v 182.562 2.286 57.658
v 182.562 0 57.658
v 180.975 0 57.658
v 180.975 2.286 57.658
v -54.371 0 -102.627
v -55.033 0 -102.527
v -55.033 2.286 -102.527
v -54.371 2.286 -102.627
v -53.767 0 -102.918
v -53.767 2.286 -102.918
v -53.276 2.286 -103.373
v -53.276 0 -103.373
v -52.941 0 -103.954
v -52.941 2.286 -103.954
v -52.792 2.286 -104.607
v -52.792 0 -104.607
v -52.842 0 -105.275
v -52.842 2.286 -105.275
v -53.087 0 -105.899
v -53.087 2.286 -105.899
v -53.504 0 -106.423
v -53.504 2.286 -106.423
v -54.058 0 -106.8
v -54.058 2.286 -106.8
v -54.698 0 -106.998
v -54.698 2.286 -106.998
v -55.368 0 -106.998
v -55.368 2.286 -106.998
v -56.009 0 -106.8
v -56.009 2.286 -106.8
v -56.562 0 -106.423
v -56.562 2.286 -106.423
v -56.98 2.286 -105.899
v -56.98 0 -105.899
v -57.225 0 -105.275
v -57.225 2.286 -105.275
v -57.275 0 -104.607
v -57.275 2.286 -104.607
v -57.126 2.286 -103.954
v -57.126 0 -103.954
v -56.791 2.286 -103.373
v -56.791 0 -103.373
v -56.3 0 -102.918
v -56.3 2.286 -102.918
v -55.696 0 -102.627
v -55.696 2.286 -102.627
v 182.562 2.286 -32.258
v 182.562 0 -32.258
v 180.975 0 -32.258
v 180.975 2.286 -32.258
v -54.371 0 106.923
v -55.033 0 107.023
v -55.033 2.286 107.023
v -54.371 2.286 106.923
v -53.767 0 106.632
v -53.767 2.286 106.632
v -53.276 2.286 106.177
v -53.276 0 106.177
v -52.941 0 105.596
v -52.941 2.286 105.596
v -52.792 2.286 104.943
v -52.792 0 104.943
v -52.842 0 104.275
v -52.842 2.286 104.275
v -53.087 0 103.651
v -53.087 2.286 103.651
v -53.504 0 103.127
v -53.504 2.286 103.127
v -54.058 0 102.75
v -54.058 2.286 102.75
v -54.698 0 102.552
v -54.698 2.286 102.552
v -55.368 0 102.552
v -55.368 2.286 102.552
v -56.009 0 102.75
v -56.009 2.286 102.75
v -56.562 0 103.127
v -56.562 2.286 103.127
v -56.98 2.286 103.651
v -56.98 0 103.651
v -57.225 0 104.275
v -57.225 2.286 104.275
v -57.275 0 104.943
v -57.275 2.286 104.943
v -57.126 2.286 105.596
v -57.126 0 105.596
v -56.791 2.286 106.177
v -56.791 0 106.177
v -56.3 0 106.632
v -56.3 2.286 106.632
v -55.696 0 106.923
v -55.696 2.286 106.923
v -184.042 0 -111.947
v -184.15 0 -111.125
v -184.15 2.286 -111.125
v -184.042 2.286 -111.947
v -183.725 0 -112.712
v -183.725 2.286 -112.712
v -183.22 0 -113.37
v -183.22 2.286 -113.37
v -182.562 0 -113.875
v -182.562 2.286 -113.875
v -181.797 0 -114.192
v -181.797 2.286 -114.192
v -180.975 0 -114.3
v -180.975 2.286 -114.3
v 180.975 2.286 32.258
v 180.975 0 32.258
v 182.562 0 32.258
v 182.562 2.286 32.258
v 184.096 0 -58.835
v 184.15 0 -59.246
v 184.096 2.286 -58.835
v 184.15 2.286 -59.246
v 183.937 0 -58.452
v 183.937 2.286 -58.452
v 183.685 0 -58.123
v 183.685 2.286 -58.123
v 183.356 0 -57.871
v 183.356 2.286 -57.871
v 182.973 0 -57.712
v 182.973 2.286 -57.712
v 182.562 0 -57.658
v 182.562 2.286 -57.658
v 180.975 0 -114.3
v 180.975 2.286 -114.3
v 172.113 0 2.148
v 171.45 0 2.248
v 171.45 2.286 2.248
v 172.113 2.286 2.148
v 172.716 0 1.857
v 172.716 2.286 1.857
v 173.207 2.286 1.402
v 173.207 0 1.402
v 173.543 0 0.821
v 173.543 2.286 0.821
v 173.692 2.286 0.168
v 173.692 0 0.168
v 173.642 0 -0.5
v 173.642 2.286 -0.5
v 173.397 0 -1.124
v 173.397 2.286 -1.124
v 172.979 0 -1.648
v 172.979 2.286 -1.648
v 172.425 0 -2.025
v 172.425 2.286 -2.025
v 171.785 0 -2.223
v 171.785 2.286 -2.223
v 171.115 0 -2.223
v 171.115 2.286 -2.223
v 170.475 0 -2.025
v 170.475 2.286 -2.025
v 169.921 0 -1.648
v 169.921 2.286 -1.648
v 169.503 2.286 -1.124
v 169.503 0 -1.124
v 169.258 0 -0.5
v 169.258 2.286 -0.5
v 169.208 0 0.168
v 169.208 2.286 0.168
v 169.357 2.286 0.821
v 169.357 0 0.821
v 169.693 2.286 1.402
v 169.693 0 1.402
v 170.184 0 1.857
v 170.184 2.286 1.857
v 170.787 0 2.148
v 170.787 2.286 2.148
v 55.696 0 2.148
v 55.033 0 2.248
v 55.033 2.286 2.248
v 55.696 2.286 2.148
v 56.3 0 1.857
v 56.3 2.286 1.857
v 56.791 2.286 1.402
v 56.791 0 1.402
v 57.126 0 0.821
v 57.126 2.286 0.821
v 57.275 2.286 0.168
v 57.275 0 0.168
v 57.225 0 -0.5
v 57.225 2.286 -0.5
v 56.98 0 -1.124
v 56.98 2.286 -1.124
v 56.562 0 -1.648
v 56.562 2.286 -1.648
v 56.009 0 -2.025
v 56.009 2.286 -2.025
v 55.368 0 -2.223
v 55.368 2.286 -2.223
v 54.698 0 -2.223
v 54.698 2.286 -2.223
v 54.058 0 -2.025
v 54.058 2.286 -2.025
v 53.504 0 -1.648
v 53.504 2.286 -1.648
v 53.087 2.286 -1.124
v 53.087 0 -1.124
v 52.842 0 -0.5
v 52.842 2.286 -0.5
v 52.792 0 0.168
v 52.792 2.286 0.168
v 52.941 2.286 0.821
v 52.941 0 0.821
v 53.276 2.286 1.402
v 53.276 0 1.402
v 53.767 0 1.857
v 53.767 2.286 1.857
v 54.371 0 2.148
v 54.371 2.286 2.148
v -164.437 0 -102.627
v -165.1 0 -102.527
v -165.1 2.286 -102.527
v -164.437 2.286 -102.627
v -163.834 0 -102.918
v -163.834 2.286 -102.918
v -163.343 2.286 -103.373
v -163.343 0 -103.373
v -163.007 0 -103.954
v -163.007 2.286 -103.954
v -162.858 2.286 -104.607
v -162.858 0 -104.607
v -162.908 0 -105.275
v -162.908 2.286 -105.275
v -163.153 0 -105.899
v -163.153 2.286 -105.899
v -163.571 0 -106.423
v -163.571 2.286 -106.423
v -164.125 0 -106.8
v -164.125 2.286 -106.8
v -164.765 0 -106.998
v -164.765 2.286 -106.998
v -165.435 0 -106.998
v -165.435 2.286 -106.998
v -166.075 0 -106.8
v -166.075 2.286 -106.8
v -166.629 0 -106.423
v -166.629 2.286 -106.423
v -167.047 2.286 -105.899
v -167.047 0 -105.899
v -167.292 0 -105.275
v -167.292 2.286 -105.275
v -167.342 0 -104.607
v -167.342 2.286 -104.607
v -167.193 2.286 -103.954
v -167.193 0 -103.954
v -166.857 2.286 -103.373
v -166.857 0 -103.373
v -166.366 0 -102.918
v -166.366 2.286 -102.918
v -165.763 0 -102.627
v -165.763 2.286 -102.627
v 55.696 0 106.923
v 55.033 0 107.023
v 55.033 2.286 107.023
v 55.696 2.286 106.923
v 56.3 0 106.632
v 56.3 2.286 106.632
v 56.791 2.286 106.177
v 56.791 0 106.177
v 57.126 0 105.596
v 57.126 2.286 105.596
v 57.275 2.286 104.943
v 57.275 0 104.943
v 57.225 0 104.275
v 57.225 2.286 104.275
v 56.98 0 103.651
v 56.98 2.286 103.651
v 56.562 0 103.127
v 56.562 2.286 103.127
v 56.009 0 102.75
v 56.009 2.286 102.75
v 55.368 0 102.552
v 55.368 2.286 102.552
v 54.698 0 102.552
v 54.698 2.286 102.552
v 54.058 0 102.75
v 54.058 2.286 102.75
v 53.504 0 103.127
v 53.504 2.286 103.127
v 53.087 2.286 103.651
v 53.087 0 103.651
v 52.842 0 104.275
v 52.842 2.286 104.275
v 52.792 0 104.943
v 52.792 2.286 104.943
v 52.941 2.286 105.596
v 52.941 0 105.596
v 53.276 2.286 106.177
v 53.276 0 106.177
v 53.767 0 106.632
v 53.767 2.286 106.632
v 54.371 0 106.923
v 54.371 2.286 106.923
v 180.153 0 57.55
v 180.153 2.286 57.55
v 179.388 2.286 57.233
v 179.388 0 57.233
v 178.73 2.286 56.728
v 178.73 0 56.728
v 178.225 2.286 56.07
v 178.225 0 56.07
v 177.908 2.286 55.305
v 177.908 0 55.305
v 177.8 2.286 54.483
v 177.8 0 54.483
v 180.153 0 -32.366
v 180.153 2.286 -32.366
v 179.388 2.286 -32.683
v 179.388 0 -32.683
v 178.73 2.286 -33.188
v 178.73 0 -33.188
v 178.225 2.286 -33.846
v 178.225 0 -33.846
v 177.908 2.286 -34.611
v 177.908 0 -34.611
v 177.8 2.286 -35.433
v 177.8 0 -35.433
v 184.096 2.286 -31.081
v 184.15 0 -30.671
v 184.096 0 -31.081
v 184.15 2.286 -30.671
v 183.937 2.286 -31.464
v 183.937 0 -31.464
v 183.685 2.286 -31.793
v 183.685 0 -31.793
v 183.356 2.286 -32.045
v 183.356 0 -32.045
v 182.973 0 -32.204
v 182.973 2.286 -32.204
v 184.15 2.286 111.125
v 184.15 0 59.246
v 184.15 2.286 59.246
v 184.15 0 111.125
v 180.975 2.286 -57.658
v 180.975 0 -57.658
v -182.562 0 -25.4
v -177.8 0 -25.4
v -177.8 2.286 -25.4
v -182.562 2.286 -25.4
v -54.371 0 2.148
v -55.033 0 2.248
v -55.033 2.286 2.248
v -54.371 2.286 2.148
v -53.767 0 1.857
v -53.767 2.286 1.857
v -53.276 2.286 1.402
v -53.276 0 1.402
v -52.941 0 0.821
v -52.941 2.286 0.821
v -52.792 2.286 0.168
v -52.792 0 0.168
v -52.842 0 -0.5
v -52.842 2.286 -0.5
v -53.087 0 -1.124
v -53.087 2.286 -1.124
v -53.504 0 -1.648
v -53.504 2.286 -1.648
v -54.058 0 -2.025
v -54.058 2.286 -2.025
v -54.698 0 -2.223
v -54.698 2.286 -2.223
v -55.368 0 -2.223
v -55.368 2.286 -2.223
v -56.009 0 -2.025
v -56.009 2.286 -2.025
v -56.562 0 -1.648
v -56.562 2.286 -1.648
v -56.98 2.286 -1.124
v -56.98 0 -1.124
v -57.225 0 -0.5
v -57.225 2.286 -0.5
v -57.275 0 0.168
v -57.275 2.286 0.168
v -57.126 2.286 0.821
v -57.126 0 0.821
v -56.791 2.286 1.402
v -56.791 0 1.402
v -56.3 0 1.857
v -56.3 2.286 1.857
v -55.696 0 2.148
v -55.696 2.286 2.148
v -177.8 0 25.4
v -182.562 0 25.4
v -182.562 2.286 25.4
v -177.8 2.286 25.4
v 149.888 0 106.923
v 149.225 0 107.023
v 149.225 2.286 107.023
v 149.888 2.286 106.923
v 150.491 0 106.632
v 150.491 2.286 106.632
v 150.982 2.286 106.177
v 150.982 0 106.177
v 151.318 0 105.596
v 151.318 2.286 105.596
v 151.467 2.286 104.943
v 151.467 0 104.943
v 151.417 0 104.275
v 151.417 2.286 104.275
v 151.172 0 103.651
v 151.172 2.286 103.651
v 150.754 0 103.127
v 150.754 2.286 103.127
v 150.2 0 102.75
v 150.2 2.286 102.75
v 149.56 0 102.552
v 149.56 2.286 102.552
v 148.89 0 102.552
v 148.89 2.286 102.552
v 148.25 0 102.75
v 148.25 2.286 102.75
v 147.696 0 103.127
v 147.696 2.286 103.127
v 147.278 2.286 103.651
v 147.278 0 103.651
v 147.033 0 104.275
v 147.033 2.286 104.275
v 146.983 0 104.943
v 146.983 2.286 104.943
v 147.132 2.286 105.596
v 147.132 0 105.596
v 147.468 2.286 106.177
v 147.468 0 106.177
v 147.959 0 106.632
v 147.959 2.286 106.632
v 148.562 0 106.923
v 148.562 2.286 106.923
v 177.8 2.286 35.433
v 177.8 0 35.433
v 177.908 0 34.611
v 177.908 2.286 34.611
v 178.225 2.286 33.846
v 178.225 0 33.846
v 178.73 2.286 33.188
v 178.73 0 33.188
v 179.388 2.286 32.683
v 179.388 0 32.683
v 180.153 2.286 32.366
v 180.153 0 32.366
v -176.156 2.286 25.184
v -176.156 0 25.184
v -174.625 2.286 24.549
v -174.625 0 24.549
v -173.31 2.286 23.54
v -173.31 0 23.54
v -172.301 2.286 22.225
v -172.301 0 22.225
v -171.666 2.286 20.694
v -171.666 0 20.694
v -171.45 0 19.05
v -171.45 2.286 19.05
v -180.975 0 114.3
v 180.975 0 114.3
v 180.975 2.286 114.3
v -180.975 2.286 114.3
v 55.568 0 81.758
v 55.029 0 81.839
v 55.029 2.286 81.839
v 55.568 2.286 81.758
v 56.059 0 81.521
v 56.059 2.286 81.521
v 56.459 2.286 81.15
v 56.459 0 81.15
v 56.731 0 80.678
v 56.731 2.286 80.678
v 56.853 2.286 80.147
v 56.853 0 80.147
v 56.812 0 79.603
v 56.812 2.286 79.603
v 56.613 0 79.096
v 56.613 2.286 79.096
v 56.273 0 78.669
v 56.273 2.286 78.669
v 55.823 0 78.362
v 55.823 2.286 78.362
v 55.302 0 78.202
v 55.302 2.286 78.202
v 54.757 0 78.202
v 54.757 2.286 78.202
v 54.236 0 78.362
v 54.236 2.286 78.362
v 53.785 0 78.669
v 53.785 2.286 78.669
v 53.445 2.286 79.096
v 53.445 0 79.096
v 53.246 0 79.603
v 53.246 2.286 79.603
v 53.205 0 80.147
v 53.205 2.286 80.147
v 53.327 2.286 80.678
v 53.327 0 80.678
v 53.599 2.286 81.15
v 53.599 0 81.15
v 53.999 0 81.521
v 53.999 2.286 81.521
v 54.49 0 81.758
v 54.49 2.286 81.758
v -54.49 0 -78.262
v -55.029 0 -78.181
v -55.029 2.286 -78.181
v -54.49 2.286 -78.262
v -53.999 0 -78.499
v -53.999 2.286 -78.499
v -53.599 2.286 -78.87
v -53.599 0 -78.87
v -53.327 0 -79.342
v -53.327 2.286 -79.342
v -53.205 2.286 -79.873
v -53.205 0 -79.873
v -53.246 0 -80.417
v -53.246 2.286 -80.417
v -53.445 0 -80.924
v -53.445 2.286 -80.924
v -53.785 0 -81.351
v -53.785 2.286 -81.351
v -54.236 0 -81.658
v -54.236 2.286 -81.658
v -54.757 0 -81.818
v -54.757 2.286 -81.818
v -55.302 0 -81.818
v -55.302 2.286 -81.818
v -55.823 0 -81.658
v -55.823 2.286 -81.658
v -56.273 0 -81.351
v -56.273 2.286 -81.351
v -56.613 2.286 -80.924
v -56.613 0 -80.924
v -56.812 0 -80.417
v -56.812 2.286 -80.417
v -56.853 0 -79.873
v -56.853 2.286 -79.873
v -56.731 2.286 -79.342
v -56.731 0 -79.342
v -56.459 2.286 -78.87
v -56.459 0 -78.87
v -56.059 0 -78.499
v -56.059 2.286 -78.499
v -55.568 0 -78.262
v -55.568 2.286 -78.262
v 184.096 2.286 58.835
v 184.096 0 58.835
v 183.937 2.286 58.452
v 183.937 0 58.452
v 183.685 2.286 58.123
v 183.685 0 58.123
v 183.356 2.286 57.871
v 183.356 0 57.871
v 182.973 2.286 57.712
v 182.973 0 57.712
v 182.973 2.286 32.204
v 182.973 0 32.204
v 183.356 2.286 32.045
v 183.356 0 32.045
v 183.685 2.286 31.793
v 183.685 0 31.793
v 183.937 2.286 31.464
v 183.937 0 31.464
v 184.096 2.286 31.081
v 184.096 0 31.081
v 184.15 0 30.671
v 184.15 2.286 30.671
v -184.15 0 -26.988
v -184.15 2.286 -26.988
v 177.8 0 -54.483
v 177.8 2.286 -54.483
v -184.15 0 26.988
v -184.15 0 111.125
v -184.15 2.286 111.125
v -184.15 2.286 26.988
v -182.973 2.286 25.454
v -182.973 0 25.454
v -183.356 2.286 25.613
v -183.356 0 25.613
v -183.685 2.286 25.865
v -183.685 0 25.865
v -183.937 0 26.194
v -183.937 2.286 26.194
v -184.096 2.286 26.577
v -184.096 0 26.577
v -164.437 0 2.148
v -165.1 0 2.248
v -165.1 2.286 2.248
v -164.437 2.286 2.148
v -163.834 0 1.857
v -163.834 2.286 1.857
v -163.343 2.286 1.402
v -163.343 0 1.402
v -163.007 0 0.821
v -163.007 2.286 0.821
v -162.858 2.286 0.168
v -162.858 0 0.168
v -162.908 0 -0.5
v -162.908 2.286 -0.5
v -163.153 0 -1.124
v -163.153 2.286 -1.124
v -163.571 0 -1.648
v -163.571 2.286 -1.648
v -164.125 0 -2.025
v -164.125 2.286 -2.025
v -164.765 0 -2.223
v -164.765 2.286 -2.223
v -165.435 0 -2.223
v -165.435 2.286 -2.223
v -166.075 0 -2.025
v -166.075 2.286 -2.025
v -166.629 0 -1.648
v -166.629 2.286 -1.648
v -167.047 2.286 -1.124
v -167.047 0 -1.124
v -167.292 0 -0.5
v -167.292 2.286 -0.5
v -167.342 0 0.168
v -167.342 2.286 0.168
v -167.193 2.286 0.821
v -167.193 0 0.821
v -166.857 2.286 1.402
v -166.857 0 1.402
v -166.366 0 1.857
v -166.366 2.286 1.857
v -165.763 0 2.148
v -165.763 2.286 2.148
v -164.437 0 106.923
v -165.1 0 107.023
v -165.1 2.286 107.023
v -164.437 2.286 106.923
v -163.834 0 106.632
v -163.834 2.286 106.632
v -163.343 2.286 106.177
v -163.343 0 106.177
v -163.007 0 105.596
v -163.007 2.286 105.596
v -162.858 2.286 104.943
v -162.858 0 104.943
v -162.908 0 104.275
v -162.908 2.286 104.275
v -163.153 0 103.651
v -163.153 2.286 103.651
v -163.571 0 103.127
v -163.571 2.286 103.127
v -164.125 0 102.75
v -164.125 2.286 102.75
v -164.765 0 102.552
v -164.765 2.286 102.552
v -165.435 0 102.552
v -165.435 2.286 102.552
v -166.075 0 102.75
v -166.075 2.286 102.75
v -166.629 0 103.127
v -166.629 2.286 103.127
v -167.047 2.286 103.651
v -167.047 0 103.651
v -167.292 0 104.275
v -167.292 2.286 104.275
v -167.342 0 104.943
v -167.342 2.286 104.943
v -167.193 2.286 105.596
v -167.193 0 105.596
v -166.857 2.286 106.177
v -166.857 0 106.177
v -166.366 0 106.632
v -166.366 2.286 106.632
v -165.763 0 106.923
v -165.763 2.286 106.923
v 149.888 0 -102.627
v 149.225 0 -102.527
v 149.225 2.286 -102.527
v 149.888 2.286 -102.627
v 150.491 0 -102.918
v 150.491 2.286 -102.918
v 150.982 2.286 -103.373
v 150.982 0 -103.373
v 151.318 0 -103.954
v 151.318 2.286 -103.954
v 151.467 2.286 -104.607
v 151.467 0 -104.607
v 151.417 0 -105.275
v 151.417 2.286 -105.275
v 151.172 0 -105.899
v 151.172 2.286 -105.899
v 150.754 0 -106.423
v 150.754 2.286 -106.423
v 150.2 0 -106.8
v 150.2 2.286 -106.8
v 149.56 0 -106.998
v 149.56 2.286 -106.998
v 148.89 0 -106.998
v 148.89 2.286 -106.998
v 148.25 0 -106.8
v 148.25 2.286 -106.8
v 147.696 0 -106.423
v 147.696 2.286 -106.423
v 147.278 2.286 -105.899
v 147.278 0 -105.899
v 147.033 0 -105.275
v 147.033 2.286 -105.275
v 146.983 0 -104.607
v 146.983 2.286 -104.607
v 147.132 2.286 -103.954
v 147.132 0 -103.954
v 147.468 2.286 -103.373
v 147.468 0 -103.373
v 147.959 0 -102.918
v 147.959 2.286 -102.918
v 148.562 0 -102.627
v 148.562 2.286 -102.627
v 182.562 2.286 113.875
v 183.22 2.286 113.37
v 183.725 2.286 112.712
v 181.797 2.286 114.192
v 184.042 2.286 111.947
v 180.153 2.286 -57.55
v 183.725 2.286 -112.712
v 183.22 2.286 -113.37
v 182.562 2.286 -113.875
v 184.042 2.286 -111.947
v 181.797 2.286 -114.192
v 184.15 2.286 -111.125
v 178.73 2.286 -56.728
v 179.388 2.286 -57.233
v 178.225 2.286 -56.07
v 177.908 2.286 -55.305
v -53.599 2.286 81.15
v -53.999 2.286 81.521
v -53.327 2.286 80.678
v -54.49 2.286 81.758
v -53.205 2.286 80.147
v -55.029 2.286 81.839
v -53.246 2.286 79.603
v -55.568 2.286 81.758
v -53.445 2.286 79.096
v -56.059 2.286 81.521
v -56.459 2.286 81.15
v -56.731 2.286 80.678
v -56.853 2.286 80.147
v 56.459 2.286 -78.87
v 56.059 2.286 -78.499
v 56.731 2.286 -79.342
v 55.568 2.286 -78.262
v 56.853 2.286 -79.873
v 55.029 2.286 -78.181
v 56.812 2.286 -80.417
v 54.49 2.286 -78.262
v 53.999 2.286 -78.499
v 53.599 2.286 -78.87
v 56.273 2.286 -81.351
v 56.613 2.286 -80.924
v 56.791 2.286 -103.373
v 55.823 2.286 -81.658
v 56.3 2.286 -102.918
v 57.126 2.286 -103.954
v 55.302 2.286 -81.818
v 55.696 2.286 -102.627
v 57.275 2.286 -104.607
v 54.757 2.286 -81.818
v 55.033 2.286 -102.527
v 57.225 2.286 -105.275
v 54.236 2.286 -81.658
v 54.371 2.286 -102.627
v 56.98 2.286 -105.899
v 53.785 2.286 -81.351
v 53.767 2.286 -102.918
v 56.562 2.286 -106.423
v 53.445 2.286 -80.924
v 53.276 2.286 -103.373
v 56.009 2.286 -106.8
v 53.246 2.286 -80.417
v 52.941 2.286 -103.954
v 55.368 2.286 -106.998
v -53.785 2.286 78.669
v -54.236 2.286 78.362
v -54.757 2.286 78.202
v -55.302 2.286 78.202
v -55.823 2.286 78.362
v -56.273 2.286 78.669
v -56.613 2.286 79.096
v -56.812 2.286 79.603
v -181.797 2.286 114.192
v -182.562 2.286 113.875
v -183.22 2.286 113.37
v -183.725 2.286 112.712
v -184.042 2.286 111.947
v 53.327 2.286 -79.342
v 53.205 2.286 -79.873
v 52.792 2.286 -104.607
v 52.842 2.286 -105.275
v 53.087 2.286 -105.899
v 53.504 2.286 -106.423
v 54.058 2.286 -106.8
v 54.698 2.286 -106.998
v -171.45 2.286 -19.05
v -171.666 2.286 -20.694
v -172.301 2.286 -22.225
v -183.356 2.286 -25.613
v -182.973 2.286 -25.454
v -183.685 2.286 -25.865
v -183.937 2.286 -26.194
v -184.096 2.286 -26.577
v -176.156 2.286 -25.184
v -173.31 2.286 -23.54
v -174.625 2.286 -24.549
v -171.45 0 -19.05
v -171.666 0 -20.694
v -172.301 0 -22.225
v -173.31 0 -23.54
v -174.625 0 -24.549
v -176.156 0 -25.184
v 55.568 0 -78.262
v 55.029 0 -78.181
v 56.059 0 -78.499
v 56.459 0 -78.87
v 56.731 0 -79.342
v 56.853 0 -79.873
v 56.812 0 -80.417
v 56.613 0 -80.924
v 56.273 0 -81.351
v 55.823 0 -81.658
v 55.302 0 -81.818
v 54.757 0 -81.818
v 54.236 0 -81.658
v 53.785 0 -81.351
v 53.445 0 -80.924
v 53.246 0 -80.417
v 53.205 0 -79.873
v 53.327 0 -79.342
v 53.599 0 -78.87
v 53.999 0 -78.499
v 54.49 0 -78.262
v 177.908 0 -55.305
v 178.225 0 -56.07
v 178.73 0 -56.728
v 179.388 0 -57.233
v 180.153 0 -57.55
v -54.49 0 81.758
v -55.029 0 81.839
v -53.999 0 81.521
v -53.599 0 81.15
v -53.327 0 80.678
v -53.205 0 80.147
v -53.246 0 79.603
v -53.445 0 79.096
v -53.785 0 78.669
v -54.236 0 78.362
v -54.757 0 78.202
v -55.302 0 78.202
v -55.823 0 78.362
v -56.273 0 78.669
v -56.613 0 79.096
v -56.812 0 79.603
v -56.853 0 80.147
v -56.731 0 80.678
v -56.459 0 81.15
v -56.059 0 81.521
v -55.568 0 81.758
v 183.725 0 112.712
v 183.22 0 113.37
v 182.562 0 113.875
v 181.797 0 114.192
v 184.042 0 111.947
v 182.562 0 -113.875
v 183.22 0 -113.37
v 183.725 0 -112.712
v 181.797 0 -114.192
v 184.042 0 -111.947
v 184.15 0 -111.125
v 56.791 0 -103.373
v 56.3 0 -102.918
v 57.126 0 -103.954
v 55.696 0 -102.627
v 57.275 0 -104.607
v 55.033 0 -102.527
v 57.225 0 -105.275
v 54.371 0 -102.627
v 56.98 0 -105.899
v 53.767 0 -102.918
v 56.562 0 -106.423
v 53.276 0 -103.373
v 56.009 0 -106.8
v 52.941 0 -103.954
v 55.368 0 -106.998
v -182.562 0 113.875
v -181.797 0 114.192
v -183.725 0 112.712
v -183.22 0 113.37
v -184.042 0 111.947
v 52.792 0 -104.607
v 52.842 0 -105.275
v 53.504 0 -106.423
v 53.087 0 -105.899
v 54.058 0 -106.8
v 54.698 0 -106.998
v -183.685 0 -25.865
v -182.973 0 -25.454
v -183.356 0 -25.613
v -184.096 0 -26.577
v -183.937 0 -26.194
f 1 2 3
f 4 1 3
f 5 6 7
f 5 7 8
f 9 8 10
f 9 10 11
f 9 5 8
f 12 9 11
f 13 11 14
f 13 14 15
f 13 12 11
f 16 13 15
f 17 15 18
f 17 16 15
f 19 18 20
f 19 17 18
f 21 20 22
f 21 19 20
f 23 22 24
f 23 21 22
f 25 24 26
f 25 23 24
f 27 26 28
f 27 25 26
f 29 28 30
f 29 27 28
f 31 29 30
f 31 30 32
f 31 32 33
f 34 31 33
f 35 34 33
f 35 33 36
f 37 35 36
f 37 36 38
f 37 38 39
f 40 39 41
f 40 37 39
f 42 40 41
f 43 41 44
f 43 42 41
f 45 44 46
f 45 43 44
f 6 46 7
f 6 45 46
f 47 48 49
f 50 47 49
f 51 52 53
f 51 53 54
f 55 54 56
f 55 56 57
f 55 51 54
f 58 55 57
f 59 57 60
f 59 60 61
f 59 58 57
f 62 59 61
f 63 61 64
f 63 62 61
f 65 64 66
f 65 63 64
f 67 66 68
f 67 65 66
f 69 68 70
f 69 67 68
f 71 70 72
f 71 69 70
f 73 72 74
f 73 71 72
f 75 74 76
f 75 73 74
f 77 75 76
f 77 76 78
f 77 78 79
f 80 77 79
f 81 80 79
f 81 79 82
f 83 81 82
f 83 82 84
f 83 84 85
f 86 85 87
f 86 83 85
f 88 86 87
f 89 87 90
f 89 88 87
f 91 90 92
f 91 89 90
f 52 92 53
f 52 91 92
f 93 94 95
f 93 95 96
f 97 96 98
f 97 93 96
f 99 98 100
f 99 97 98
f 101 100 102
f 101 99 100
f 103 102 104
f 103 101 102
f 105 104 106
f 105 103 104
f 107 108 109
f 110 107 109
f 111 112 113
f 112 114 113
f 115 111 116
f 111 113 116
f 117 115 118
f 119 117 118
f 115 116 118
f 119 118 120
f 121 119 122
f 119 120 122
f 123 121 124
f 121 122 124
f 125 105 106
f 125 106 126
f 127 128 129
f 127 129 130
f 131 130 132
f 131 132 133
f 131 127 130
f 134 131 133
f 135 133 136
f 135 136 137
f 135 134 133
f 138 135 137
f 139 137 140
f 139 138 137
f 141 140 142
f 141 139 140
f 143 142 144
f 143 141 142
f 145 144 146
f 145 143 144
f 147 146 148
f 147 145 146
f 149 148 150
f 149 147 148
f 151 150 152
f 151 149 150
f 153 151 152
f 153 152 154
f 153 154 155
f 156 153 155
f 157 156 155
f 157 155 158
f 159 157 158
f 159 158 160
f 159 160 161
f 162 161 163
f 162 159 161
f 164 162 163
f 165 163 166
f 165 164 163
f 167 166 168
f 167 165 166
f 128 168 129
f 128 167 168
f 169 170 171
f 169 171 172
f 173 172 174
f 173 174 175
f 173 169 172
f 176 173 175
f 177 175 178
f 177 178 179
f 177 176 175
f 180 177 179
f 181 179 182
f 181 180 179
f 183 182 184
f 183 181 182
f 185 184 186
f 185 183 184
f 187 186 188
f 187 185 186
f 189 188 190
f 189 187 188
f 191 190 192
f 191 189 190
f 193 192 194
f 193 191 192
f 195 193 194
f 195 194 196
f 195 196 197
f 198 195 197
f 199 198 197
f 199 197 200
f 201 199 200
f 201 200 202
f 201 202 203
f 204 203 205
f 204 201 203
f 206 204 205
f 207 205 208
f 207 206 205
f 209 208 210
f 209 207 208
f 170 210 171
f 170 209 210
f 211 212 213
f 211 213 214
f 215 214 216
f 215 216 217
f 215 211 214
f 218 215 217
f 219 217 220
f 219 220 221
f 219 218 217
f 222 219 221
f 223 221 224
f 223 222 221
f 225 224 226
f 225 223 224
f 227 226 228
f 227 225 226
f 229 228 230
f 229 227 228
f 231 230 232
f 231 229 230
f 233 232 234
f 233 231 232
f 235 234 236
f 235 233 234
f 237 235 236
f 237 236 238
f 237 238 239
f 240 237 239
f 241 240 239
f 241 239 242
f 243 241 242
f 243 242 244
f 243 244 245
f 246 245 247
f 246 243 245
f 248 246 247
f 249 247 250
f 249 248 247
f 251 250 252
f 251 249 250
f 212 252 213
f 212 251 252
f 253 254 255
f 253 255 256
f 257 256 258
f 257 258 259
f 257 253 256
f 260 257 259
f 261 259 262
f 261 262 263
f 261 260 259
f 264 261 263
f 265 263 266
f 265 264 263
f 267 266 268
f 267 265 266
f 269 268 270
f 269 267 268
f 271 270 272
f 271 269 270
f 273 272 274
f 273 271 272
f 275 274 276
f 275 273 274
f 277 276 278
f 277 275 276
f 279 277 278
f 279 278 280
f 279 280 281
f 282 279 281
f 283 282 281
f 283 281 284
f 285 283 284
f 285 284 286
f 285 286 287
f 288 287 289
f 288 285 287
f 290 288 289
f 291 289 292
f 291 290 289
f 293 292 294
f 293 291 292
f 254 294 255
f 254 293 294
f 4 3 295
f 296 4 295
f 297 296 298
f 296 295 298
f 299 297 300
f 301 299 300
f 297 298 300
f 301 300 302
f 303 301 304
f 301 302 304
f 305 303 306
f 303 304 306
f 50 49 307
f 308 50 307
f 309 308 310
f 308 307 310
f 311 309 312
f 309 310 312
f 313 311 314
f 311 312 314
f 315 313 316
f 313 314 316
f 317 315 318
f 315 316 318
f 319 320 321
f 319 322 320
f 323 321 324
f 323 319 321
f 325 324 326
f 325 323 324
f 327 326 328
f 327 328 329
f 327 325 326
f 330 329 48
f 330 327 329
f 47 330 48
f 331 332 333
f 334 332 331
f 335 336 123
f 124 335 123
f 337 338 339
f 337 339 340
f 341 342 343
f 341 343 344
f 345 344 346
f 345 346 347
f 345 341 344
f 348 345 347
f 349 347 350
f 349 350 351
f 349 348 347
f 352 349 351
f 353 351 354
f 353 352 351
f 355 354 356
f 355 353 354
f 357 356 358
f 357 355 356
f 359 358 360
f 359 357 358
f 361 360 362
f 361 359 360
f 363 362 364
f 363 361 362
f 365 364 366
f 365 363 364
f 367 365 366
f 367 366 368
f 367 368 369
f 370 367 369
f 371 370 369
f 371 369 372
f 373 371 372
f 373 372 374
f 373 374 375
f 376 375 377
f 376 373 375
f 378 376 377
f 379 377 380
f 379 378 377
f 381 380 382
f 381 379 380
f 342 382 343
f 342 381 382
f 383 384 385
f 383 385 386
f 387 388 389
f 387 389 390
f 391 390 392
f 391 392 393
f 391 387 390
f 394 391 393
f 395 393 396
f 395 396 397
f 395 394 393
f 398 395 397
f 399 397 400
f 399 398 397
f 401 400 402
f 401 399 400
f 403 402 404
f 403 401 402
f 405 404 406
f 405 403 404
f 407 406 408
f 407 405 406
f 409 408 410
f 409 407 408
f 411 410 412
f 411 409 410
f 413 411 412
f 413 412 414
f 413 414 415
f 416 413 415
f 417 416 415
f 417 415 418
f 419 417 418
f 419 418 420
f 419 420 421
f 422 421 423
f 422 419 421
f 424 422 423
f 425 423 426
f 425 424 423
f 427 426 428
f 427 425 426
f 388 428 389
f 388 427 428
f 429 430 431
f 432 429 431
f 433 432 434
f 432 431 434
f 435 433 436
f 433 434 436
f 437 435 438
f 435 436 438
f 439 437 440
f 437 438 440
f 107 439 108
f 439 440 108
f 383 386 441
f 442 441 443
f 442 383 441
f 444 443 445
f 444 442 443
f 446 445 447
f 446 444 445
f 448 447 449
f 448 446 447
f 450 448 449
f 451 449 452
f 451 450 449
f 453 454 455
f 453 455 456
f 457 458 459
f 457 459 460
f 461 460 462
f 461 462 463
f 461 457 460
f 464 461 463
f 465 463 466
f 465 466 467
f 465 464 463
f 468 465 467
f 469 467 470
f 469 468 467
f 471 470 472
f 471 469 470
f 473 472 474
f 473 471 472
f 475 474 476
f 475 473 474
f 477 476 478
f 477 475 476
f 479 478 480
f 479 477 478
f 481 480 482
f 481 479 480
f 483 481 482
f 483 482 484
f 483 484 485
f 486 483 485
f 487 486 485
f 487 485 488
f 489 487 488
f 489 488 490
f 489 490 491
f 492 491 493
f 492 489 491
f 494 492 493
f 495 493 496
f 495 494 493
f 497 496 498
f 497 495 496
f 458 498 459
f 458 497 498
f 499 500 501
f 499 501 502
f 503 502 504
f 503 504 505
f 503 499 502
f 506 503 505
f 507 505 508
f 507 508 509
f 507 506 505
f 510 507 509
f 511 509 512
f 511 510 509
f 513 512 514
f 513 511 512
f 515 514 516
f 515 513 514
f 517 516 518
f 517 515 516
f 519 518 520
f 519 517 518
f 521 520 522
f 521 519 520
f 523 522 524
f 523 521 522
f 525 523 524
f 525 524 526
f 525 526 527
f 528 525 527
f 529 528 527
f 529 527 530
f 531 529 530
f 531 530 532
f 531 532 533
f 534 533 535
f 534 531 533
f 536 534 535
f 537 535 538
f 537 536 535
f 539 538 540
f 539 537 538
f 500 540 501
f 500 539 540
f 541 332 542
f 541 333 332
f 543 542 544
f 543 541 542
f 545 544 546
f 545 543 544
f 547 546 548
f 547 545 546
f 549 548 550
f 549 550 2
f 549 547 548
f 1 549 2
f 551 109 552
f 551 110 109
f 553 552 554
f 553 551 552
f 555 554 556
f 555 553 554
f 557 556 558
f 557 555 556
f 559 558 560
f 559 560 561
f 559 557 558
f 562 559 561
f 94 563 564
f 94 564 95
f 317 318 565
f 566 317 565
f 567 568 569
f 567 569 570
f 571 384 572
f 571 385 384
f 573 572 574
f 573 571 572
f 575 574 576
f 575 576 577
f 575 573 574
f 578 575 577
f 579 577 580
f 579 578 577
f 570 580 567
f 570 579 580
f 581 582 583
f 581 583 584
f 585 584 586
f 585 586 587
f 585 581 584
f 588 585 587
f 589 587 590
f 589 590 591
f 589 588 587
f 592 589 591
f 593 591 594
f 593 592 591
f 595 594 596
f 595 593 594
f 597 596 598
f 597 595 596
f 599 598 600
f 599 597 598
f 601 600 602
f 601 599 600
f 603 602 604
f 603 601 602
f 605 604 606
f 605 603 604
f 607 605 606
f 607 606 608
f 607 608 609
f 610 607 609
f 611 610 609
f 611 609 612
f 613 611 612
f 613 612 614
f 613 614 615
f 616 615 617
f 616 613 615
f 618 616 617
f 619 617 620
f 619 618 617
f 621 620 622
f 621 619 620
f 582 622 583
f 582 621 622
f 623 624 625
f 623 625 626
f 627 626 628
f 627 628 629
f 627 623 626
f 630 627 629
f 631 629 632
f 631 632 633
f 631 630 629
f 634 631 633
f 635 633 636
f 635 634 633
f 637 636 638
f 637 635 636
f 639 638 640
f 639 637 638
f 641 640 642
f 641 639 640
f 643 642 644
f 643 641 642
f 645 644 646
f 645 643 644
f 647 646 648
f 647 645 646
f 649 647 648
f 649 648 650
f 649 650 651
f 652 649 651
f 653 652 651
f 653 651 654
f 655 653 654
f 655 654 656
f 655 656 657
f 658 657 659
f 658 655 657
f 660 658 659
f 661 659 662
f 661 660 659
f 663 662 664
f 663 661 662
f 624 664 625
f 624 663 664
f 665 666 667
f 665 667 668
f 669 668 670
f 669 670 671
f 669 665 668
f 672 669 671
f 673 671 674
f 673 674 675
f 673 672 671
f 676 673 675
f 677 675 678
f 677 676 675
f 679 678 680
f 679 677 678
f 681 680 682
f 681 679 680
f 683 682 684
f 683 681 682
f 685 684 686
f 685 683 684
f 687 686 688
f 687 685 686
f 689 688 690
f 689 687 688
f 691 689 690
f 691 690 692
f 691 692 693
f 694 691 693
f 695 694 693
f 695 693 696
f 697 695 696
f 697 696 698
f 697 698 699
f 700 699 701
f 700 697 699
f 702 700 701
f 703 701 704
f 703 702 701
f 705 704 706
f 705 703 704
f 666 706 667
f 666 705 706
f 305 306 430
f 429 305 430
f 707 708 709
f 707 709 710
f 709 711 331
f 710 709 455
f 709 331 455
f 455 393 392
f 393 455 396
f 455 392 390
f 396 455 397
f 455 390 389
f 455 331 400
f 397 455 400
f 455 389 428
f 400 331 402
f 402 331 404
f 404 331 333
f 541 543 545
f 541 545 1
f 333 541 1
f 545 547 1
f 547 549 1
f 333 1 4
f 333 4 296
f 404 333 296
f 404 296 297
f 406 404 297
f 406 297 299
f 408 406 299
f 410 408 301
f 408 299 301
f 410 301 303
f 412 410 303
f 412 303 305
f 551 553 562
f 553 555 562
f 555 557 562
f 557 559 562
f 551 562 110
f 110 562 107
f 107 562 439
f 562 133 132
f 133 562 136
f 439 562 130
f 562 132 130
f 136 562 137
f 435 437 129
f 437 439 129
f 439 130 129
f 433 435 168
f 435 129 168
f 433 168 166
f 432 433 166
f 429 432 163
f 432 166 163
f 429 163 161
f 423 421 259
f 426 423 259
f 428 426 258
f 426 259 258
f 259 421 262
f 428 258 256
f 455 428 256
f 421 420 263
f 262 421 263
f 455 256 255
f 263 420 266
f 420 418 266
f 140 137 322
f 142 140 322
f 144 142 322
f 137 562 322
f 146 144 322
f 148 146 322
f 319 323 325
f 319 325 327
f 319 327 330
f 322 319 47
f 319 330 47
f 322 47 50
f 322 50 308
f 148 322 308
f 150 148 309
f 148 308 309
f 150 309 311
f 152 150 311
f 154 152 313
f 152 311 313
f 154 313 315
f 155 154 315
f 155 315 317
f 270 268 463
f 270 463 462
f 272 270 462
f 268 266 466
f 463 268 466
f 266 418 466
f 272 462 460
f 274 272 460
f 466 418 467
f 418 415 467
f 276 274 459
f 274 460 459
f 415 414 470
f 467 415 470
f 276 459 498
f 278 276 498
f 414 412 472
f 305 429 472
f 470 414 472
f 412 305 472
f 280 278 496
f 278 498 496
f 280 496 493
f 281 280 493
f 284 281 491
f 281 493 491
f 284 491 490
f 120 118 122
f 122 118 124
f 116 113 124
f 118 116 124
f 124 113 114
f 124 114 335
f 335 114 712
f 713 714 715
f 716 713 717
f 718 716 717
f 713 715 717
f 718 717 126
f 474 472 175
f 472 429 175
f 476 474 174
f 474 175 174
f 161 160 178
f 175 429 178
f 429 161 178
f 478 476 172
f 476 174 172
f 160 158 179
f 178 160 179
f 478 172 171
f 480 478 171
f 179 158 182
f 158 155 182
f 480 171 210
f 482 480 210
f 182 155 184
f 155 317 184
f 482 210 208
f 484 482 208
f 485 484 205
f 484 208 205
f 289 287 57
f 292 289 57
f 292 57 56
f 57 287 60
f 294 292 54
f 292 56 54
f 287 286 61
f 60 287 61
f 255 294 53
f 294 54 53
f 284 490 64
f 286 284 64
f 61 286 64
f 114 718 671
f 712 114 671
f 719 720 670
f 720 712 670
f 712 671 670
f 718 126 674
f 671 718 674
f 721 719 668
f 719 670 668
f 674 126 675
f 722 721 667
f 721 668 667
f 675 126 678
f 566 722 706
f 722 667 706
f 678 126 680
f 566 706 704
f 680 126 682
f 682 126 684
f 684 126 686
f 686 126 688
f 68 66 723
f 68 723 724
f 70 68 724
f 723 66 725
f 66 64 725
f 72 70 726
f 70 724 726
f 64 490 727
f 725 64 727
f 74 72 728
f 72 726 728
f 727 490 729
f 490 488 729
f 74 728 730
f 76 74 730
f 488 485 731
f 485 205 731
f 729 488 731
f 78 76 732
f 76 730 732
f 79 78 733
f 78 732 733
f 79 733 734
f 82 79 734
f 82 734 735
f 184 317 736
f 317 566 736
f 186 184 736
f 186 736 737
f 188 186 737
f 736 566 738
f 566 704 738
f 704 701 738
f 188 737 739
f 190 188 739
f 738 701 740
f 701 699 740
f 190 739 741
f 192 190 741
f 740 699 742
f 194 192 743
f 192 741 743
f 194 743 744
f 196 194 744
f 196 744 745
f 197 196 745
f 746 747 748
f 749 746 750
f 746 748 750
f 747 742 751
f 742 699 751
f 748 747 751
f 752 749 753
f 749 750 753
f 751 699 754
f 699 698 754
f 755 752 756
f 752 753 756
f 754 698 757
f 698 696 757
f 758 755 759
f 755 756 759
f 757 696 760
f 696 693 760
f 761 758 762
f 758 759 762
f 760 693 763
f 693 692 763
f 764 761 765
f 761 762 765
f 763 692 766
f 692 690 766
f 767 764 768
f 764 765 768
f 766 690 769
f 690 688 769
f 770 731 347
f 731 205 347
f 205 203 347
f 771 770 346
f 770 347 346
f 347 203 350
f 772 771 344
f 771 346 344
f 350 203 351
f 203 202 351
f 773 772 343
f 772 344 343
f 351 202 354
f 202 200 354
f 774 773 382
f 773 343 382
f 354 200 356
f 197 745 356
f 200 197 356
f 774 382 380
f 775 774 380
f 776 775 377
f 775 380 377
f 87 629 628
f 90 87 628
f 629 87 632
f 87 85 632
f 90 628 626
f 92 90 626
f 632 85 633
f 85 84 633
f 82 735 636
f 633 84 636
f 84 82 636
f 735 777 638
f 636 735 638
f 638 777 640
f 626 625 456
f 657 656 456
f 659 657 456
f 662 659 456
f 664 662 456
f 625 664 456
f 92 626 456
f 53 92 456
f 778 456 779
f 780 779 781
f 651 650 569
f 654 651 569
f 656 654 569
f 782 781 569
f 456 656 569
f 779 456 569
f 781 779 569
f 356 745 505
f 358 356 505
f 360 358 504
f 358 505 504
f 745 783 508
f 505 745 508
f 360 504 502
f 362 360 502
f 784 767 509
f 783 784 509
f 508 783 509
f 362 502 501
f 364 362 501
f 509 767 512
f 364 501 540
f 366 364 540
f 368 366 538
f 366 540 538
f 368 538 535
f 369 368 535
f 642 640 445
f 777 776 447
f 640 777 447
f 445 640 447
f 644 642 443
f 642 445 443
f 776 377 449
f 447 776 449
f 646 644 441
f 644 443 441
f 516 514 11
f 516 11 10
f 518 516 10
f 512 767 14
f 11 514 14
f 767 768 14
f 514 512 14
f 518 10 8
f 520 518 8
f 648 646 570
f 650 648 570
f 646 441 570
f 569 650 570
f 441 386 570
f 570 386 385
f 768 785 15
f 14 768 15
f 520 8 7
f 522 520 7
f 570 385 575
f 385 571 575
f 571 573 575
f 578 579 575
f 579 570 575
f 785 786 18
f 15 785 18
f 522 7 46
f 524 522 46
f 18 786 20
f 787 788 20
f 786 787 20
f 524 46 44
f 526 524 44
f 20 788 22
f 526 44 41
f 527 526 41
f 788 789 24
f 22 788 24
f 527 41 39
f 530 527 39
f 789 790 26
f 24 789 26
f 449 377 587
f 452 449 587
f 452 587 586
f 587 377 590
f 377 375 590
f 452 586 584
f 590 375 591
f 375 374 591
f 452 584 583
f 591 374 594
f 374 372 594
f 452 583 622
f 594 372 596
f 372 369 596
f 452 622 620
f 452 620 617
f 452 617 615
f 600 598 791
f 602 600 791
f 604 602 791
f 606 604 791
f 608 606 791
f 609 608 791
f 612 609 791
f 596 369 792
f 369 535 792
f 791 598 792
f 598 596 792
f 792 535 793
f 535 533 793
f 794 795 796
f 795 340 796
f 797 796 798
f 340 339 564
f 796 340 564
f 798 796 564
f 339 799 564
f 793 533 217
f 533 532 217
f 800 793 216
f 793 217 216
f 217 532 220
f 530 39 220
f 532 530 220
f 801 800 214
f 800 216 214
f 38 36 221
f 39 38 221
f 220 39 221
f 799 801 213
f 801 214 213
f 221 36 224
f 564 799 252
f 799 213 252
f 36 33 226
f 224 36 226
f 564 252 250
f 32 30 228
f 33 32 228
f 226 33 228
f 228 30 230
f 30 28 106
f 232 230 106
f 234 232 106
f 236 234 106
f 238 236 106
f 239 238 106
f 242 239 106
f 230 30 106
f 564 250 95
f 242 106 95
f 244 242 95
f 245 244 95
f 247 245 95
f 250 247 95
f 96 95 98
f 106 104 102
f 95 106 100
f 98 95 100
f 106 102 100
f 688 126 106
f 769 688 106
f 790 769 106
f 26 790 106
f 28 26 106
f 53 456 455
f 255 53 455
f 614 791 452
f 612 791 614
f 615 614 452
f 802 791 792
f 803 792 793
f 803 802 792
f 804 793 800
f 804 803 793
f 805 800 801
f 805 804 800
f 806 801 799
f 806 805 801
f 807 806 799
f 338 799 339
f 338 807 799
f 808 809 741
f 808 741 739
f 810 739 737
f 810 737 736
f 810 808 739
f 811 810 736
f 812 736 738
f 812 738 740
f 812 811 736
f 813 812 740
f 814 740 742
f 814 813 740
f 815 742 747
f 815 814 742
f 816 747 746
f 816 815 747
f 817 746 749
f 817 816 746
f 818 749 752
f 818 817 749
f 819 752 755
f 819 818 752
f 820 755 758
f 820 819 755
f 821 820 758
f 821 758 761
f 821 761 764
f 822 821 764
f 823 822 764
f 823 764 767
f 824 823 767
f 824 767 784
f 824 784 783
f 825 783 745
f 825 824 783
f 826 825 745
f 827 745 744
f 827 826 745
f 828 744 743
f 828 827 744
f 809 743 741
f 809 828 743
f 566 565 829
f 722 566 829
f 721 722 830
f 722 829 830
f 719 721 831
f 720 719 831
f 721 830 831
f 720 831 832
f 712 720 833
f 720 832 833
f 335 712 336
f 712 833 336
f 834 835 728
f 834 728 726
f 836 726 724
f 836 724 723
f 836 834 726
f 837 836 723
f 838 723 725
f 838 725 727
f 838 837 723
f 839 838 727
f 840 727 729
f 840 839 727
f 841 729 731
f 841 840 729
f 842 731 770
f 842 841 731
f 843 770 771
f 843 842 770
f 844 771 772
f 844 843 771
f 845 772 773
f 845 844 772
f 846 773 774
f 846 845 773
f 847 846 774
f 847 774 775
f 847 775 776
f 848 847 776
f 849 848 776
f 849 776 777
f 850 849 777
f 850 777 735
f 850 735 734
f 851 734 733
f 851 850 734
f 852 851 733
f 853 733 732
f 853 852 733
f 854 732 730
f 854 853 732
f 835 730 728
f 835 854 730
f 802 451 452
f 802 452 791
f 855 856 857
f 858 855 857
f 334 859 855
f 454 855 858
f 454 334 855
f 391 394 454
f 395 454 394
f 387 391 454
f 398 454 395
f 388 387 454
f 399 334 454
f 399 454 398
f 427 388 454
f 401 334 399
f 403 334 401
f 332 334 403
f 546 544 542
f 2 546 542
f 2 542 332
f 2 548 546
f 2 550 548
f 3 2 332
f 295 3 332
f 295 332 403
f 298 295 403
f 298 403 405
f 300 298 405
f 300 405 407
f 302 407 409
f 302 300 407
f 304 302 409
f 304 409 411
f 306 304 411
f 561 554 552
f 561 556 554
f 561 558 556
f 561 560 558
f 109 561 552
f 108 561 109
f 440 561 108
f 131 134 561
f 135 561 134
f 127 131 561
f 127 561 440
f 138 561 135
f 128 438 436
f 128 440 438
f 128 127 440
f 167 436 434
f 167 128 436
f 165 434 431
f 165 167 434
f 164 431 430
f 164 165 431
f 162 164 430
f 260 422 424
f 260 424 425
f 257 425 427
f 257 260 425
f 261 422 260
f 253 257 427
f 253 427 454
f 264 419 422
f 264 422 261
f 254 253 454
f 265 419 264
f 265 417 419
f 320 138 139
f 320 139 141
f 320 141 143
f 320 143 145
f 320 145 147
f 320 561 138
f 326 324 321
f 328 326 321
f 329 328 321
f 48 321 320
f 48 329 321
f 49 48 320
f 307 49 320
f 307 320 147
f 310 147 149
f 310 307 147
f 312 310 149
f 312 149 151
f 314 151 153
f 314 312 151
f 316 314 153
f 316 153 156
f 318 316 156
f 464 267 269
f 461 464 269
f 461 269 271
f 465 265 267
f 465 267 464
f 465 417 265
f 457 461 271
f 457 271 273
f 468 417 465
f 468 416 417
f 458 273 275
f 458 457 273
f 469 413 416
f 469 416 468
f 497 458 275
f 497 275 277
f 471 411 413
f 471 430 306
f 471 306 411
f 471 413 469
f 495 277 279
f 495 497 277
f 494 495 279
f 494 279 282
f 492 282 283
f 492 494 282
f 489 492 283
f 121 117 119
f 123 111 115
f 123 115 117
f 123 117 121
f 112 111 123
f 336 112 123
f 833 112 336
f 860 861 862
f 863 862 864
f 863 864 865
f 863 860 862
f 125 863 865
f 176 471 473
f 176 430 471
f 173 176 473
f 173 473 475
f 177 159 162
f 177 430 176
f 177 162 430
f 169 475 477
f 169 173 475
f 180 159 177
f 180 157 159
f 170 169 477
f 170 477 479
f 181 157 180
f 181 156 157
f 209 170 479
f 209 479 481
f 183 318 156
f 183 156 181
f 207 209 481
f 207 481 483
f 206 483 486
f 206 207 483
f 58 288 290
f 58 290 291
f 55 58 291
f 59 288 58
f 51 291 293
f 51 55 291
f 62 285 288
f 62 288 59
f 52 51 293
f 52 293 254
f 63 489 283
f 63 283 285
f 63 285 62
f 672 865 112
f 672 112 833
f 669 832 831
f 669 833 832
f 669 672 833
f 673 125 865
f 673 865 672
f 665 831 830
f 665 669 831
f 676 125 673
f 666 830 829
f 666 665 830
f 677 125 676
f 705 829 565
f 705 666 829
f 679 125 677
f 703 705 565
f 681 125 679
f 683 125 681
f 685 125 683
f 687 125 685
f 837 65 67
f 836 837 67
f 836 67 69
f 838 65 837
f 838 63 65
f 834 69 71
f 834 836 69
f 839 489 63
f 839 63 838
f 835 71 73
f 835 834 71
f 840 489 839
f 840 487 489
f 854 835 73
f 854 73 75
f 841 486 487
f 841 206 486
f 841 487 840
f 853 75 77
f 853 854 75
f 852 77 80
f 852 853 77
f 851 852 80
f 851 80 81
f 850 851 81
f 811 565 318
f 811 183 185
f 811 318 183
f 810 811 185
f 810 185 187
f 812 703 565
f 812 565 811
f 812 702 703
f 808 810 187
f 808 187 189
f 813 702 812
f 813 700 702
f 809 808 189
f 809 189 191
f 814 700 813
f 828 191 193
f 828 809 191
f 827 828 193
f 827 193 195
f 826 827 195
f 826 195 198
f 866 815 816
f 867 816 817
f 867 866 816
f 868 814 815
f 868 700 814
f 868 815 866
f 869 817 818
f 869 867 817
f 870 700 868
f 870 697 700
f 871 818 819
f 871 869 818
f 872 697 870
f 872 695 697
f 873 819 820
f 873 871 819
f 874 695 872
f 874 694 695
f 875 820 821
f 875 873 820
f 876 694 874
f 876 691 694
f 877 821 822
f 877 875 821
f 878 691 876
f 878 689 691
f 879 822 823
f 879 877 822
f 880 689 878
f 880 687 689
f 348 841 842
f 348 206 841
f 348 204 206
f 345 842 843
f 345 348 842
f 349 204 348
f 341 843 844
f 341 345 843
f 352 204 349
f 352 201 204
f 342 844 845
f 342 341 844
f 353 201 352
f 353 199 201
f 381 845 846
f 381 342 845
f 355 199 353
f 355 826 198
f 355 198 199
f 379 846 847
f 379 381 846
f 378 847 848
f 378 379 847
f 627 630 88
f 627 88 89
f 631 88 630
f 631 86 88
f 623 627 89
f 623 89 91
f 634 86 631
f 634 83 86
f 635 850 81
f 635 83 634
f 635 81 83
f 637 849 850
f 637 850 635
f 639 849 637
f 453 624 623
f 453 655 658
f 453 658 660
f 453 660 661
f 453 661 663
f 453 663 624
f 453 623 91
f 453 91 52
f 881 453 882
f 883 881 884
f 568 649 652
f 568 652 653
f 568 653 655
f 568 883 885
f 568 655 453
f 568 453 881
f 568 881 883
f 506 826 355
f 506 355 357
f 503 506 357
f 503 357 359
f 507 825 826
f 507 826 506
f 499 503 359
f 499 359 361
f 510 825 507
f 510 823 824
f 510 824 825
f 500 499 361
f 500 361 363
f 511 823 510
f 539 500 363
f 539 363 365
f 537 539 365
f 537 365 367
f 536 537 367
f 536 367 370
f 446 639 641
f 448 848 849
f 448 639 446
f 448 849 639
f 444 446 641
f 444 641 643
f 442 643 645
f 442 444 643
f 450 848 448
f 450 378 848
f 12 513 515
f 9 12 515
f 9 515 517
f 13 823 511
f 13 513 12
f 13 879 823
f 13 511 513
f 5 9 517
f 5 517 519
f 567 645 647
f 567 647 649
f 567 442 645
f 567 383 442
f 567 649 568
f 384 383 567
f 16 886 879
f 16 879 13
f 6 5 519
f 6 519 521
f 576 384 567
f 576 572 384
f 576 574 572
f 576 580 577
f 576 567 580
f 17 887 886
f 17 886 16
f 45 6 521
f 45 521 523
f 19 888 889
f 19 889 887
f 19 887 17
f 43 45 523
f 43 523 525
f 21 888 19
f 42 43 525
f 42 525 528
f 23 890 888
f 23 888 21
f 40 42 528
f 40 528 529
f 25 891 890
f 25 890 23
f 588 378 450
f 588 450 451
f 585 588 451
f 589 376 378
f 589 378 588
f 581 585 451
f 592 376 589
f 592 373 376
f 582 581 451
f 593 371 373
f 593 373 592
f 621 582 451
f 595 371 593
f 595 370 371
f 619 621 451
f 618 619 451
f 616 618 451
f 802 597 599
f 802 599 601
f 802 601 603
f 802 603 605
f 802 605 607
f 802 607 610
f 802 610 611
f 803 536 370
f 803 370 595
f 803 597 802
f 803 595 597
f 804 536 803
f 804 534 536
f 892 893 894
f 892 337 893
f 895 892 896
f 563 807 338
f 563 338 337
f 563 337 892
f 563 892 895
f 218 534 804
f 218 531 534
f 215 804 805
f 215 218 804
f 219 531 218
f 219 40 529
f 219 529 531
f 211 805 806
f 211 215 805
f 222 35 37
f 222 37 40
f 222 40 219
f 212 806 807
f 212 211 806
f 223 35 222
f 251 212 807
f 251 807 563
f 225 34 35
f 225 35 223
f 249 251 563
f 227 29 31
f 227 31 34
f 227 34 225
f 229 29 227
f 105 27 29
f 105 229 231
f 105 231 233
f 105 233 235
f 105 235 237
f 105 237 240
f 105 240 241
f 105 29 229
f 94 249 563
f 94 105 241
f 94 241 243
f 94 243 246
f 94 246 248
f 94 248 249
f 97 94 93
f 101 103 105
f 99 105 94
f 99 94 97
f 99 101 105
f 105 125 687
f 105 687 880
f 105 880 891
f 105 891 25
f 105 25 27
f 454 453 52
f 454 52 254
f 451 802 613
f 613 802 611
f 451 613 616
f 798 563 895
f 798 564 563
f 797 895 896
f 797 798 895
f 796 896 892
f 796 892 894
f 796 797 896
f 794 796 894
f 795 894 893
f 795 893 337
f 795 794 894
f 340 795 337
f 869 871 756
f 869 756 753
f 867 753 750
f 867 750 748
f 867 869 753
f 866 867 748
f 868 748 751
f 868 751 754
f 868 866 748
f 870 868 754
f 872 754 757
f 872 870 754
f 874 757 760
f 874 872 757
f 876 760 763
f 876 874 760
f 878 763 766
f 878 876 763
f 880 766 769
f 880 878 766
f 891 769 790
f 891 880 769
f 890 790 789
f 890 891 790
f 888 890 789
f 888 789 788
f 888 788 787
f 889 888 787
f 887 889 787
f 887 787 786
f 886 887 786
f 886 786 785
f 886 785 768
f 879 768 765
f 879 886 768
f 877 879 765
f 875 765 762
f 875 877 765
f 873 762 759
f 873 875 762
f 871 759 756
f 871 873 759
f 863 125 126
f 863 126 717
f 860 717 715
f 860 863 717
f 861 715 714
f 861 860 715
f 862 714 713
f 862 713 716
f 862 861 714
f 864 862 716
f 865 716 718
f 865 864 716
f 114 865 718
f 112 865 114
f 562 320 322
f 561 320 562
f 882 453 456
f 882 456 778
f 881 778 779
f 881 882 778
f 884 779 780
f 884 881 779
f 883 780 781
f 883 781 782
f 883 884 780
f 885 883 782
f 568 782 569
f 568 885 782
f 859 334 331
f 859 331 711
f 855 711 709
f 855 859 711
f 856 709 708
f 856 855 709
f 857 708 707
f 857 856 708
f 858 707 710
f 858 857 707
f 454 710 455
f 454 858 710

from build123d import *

# Parameters (mm, degrees)
SKETCH1_R           = 2.2479
SKETCH1_R_2         = 1.8288
BOSS_EXTRUDE1_DEPTH = 2.286
CUT_EXTRUDE1_DEPTH  = 217.750866886
FILLET1_R           = 1.5875


with BuildPart() as part:
    # Sketch1 → Boss-Extrude1 (new body)
    with BuildSketch(Plane(origin=(0, 0, 0), x_dir=(1, 0, 0), z_dir=(0, 1, 0))):
        with BuildLine():
            Line((-180.975, 114.3), (180.975, 114.3))
            ThreePointArc((180.975, 114.3), (183.22006403, 113.37006403), (184.15, 111.125))
            Line((184.15, 111.125), (184.15, -111.125))
            ThreePointArc((184.15, -111.125), (183.22006403, -113.37006403), (180.975, -114.3))
            Line((180.975, -114.3), (-180.975, -114.3))
            ThreePointArc((-180.975, -114.3), (-183.22006403, -113.37006403), (-184.15, -111.125))
            Line((-184.15, -111.125), (-184.15, 111.125))
            ThreePointArc((-184.15, 111.125), (-183.22006403, 113.37006403), (-180.975, 114.3))
        make_face()
        with Locations(Location((-165.1, 104.775, 0), (0, 0, 270))):
            Circle(SKETCH1_R, mode=Mode.SUBTRACT)
        with Locations(Location((-55.033333333, 104.775, 0), (0, 0, 270))):
            Circle(SKETCH1_R, mode=Mode.SUBTRACT)
        with Locations(Location((55.033333333, 104.775, 0), (0, 0, 270))):
            Circle(SKETCH1_R, mode=Mode.SUBTRACT)
        with Locations(Location((55.033333333, -104.775, 0), (0, 0, 270))):
            Circle(SKETCH1_R, mode=Mode.SUBTRACT)
        with Locations(Location((-55.033333333, -104.775, 0), (0, 0, 270))):
            Circle(SKETCH1_R, mode=Mode.SUBTRACT)
        with Locations(Location((-165.1, -104.775, 0), (0, 0, 270))):
            Circle(SKETCH1_R, mode=Mode.SUBTRACT)
        with Locations(Location((-55.033333333, 0, 0), (0, 0, 270))):
            Circle(SKETCH1_R, mode=Mode.SUBTRACT)
        with Locations(Location((55.033333333, 0, 0), (0, 0, 270))):
            Circle(SKETCH1_R, mode=Mode.SUBTRACT)
        with Locations(Location((149.225, -104.775, 0), (0, 0, 270))):
            Circle(SKETCH1_R, mode=Mode.SUBTRACT)
        with Locations(Location((149.225, 104.775, 0), (0, 0, 270))):
            Circle(SKETCH1_R, mode=Mode.SUBTRACT)
        with Locations(Location((55.0291, -80.01, 0), (0, 0, 270))):
            Circle(SKETCH1_R_2, mode=Mode.SUBTRACT)
        with Locations(Location((-55.0291, -80.01, 0), (0, 0, 270))):
            Circle(SKETCH1_R_2, mode=Mode.SUBTRACT)
        with Locations(Location((-55.0291, 80.01, 0), (0, 0, 270))):
            Circle(SKETCH1_R_2, mode=Mode.SUBTRACT)
        with Locations(Location((55.0291, 80.01, 0), (0, 0, 270))):
            Circle(SKETCH1_R_2, mode=Mode.SUBTRACT)
        with Locations(Location((171.45, 0, 0), (0, 0, 270))):
            Circle(SKETCH1_R, mode=Mode.SUBTRACT)
        with Locations(Location((-165.1, 0, 0), (0, 0, 270))):
            Circle(SKETCH1_R, mode=Mode.SUBTRACT)
    extrude(amount=BOSS_EXTRUDE1_DEPTH)

    # Sketch2 → Cut-Extrude1 (cut, through all)
    with BuildSketch(Plane.XZ):
        with BuildLine():
            Line((184.15, 57.658), (180.975, 57.658))
            ThreePointArc((180.975, 57.658), (178.72993597, 56.72806403), (177.8, 54.483))
            Line((177.8, 54.483), (177.8, 35.433))
            ThreePointArc((177.8, 35.433), (178.72993597, 33.18793597), (180.975, 32.258))
            Line((180.975, 32.258), (184.15, 32.258))
            Line((184.15, 32.258), (184.15, 57.658))
        make_face()
        with BuildLine():
            Line((184.15, -32.258), (180.975, -32.258))
            ThreePointArc((180.975, -32.258), (178.72993597, -33.18793597), (177.8, -35.433))
            Line((177.8, -35.433), (177.8, -54.483))
            ThreePointArc((177.8, -54.483), (178.72993597, -56.72806403), (180.975, -57.658))
            Line((180.975, -57.658), (184.15, -57.658))
            Line((184.15, -57.658), (184.15, -32.258))
        make_face()
        with BuildLine():
            Line((-184.15, 25.4), (-177.8, 25.4))
            ThreePointArc((-177.8, 25.4), (-173.309871939, 23.540128061), (-171.45, 19.05))
            Line((-171.45, 19.05), (-171.45, -19.05))
            ThreePointArc((-171.45, -19.05), (-173.309871939, -23.540128061), (-177.8, -25.4))
            Line((-177.8, -25.4), (-184.15, -25.4))
            Line((-184.15, -25.4), (-184.15, 25.4))
        make_face()
    extrude(amount=-CUT_EXTRUDE1_DEPTH, mode=Mode.SUBTRACT)

    # Fillet1
    fillet1_edges = [part.edges().sort_by_distance(p)[0] for p in [
        (184.15, 1.143, 57.658),
        (184.15, 1.143, 32.258),
        (184.15, 1.143, -32.258),
        (184.15, 1.143, -57.658),
        (-184.15, 1.143, -25.4),
        (-184.15, 1.143, 25.4),
    ]]
    fillet(fillet1_edges, radius=FILLET1_R)


solid = part.part
